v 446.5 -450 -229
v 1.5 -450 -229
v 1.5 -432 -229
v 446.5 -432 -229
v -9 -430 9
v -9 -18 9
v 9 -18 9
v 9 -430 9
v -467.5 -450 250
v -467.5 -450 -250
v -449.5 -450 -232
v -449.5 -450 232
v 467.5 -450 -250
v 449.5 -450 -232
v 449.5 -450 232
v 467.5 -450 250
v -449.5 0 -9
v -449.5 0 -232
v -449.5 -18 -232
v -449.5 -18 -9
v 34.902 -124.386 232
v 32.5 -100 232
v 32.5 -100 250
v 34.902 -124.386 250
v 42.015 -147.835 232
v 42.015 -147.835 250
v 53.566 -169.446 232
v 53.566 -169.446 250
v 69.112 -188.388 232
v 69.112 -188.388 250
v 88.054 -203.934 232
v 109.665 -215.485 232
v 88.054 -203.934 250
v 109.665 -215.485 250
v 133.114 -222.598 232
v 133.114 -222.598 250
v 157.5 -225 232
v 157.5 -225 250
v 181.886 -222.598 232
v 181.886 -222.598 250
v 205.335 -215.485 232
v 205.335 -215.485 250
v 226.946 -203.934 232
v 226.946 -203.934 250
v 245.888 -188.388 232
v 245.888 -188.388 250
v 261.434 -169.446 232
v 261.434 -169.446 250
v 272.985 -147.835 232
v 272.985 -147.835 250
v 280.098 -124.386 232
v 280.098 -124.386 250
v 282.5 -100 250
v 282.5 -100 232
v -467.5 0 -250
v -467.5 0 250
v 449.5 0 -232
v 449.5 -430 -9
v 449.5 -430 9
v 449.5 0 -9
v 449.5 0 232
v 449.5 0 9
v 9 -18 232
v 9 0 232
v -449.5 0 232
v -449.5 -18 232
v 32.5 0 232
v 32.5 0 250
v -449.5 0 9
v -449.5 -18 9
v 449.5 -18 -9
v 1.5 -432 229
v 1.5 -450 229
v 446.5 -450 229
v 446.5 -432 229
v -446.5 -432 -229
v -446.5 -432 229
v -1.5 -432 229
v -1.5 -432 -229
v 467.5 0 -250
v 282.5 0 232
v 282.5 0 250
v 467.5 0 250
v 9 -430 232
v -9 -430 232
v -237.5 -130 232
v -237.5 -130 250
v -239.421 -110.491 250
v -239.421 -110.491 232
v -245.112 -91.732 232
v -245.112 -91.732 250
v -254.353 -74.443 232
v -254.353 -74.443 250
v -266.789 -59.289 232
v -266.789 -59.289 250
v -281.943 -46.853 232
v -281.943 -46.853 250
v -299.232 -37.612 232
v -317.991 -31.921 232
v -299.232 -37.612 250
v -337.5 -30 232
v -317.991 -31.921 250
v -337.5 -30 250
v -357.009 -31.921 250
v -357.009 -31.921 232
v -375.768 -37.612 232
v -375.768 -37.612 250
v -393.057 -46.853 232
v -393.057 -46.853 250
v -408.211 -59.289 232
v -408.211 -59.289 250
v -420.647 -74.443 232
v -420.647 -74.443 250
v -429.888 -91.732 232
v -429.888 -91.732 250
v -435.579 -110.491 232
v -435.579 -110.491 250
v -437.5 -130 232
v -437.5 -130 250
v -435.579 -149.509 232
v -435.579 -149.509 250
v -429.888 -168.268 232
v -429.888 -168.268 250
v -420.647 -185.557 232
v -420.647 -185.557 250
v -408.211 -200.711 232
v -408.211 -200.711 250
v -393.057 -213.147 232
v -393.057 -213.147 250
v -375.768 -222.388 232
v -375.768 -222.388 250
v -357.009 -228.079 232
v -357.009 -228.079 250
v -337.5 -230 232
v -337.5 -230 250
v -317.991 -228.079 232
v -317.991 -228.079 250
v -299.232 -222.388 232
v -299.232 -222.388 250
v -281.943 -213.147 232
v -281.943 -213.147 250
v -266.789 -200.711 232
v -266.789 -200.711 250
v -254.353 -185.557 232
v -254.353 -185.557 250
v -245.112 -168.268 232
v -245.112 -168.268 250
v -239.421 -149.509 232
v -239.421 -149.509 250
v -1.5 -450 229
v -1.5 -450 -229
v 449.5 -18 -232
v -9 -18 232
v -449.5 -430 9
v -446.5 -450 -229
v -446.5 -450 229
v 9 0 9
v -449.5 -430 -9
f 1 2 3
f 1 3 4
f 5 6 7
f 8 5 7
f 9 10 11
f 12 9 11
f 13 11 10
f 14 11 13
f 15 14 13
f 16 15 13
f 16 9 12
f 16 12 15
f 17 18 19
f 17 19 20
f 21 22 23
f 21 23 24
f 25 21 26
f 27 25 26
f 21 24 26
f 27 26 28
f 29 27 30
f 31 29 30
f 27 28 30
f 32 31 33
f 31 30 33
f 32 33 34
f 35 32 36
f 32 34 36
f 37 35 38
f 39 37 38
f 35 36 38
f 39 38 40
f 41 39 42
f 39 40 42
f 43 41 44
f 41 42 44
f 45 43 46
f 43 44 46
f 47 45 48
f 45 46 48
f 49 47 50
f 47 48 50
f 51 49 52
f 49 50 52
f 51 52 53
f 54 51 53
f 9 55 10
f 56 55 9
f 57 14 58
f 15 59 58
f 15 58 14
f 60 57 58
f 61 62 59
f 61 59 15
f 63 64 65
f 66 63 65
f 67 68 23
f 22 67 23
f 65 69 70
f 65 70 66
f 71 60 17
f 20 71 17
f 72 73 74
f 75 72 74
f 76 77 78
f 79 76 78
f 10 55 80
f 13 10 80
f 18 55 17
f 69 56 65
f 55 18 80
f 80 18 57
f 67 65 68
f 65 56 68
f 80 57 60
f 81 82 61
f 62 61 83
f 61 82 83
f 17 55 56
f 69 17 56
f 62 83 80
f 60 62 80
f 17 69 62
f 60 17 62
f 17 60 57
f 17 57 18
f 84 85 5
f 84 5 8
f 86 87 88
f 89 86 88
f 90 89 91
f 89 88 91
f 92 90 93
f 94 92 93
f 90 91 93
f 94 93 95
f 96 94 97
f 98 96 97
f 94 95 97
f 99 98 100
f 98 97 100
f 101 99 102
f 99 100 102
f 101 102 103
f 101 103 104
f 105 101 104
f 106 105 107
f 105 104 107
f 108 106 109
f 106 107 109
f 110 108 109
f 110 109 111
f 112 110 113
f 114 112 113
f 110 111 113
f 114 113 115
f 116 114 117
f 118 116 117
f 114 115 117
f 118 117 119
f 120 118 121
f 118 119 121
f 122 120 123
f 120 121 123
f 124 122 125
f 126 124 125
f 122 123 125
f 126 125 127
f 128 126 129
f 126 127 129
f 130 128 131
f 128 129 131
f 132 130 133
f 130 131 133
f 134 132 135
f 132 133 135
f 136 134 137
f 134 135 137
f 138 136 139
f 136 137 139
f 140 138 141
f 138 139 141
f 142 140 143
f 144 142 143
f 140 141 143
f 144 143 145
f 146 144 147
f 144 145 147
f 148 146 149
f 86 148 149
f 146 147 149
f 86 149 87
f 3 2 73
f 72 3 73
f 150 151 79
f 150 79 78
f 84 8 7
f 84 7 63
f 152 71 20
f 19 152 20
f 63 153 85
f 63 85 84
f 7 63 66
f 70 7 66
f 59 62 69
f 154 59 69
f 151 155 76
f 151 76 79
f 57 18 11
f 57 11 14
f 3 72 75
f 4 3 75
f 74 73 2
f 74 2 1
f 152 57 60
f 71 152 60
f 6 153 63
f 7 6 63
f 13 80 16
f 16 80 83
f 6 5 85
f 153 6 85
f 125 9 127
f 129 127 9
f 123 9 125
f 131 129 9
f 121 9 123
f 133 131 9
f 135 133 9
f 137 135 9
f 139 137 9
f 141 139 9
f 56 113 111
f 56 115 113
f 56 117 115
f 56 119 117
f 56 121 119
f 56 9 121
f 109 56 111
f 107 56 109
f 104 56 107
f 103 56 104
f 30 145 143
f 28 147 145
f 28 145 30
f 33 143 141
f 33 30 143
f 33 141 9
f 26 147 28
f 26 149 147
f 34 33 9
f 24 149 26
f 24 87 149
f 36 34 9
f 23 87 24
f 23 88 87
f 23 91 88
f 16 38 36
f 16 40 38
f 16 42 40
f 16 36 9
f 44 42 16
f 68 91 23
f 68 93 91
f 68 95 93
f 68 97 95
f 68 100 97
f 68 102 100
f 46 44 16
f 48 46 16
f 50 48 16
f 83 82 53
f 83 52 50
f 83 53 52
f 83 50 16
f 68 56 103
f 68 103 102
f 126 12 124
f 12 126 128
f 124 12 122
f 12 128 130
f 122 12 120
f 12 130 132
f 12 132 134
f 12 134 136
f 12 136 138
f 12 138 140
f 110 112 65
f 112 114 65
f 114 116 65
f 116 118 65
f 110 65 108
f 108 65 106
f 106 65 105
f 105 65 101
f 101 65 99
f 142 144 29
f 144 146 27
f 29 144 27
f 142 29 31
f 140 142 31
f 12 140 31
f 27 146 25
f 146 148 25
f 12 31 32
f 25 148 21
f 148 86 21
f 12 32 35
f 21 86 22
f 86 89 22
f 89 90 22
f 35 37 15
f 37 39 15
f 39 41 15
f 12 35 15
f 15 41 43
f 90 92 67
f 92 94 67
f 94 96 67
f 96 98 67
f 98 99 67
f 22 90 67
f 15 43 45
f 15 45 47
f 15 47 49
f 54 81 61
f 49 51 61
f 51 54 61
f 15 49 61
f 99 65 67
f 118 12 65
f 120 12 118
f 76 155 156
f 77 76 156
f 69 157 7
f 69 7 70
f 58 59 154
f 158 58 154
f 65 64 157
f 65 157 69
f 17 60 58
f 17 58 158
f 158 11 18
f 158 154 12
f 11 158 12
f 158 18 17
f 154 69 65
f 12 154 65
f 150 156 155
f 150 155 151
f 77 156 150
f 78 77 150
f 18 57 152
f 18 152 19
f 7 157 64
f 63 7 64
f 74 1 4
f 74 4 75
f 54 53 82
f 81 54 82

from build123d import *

# Parameters (mm, degrees)
F0_W      = 935
F0_H      = 500
F0_W_2    = 899
F0_H_2    = 464
F1_DEPTH  = 450
F2_W      = 899
F2_H      = 18
F3_DEPTH  = 430
F4_R      = 100
F5_DEPTH  = 18
F7_DEPTH  = 18
F8_W      = 445
F8_H      = 458
F9_DEPTH  = 18
F10_W     = 899
F10_H     = 223
F10_W_2   = 458.5
F11_DEPTH = 18
F12_W     = 18
F12_H     = 223
F13_DEPTH = 412


with BuildPart() as f1:
    # F0 (on Front) → F1 (new body)
    with BuildSketch(Plane.XZ):
        Rectangle(F0_W, F0_H)
        Rectangle(F0_W_2, F0_H_2, mode=Mode.SUBTRACT)
    extrude(amount=F1_DEPTH)

    # F2 (on face) → F3 (join)
    with BuildSketch(Plane(origin=(0, 0, 0), x_dir=(-1, 0, 0), z_dir=(0, 1, 0))):
        Rectangle(F2_W, F2_H)
    extrude(amount=-F3_DEPTH)

    # F4 (on face) → F5 (cut, through all)
    with BuildSketch(Plane.XY.offset(250)):
        with Locations((-337.5, -130)):
            Circle(F4_R)
    extrude(amount=-F5_DEPTH, mode=Mode.SUBTRACT)

    # F6 (on face) → F7 (cut, through all)
    with BuildSketch(Plane.XY.offset(250)):
        with BuildLine():
            Line((282.5, 0), (32.5, 0))
            Line((32.5, 0), (32.5, -60))
            Line((32.5, -60), (32.5, -100))
            ThreePointArc((32.5, -100), (157.5, -225), (282.5, -100))
            Line((282.5, -100), (282.5, -60))
            Line((282.5, -60), (282.5, 0))
        make_face()
    extrude(amount=-F7_DEPTH, mode=Mode.SUBTRACT)


with BuildPart() as f9:
    # F8 (on face) → F9 (new body)
    with BuildSketch(Plane.XZ.offset(450)):
        with Locations((224, 0)):
            Rectangle(F8_W, F8_H)
        with Locations((-224, 0)):
            Rectangle(F8_W, F8_H)
    extrude(amount=-F9_DEPTH)


with BuildPart() as f11:
    # F10 (on face) → F11 (new body)
    with BuildSketch(Plane(origin=(0, 0, 0), x_dir=(-1, 0, 0), z_dir=(0, 1, 0))):
        with Locations((0, -120.5)):
            Rectangle(F10_W, F10_H)
        with Locations((220.25, 120.5)):
            Rectangle(F10_W_2, F10_H)
    extrude(amount=-F11_DEPTH)


with BuildPart() as f13:
    # F12 (on face) → F13 (new body, through all)
    with BuildSketch(Plane.XZ.offset(18)):
        with Locations((0, 120.5)):
            Rectangle(F12_W, F12_H)
    extrude(amount=F13_DEPTH)


solid = Compound([f1.part, f9.part, f11.part, f13.part])
